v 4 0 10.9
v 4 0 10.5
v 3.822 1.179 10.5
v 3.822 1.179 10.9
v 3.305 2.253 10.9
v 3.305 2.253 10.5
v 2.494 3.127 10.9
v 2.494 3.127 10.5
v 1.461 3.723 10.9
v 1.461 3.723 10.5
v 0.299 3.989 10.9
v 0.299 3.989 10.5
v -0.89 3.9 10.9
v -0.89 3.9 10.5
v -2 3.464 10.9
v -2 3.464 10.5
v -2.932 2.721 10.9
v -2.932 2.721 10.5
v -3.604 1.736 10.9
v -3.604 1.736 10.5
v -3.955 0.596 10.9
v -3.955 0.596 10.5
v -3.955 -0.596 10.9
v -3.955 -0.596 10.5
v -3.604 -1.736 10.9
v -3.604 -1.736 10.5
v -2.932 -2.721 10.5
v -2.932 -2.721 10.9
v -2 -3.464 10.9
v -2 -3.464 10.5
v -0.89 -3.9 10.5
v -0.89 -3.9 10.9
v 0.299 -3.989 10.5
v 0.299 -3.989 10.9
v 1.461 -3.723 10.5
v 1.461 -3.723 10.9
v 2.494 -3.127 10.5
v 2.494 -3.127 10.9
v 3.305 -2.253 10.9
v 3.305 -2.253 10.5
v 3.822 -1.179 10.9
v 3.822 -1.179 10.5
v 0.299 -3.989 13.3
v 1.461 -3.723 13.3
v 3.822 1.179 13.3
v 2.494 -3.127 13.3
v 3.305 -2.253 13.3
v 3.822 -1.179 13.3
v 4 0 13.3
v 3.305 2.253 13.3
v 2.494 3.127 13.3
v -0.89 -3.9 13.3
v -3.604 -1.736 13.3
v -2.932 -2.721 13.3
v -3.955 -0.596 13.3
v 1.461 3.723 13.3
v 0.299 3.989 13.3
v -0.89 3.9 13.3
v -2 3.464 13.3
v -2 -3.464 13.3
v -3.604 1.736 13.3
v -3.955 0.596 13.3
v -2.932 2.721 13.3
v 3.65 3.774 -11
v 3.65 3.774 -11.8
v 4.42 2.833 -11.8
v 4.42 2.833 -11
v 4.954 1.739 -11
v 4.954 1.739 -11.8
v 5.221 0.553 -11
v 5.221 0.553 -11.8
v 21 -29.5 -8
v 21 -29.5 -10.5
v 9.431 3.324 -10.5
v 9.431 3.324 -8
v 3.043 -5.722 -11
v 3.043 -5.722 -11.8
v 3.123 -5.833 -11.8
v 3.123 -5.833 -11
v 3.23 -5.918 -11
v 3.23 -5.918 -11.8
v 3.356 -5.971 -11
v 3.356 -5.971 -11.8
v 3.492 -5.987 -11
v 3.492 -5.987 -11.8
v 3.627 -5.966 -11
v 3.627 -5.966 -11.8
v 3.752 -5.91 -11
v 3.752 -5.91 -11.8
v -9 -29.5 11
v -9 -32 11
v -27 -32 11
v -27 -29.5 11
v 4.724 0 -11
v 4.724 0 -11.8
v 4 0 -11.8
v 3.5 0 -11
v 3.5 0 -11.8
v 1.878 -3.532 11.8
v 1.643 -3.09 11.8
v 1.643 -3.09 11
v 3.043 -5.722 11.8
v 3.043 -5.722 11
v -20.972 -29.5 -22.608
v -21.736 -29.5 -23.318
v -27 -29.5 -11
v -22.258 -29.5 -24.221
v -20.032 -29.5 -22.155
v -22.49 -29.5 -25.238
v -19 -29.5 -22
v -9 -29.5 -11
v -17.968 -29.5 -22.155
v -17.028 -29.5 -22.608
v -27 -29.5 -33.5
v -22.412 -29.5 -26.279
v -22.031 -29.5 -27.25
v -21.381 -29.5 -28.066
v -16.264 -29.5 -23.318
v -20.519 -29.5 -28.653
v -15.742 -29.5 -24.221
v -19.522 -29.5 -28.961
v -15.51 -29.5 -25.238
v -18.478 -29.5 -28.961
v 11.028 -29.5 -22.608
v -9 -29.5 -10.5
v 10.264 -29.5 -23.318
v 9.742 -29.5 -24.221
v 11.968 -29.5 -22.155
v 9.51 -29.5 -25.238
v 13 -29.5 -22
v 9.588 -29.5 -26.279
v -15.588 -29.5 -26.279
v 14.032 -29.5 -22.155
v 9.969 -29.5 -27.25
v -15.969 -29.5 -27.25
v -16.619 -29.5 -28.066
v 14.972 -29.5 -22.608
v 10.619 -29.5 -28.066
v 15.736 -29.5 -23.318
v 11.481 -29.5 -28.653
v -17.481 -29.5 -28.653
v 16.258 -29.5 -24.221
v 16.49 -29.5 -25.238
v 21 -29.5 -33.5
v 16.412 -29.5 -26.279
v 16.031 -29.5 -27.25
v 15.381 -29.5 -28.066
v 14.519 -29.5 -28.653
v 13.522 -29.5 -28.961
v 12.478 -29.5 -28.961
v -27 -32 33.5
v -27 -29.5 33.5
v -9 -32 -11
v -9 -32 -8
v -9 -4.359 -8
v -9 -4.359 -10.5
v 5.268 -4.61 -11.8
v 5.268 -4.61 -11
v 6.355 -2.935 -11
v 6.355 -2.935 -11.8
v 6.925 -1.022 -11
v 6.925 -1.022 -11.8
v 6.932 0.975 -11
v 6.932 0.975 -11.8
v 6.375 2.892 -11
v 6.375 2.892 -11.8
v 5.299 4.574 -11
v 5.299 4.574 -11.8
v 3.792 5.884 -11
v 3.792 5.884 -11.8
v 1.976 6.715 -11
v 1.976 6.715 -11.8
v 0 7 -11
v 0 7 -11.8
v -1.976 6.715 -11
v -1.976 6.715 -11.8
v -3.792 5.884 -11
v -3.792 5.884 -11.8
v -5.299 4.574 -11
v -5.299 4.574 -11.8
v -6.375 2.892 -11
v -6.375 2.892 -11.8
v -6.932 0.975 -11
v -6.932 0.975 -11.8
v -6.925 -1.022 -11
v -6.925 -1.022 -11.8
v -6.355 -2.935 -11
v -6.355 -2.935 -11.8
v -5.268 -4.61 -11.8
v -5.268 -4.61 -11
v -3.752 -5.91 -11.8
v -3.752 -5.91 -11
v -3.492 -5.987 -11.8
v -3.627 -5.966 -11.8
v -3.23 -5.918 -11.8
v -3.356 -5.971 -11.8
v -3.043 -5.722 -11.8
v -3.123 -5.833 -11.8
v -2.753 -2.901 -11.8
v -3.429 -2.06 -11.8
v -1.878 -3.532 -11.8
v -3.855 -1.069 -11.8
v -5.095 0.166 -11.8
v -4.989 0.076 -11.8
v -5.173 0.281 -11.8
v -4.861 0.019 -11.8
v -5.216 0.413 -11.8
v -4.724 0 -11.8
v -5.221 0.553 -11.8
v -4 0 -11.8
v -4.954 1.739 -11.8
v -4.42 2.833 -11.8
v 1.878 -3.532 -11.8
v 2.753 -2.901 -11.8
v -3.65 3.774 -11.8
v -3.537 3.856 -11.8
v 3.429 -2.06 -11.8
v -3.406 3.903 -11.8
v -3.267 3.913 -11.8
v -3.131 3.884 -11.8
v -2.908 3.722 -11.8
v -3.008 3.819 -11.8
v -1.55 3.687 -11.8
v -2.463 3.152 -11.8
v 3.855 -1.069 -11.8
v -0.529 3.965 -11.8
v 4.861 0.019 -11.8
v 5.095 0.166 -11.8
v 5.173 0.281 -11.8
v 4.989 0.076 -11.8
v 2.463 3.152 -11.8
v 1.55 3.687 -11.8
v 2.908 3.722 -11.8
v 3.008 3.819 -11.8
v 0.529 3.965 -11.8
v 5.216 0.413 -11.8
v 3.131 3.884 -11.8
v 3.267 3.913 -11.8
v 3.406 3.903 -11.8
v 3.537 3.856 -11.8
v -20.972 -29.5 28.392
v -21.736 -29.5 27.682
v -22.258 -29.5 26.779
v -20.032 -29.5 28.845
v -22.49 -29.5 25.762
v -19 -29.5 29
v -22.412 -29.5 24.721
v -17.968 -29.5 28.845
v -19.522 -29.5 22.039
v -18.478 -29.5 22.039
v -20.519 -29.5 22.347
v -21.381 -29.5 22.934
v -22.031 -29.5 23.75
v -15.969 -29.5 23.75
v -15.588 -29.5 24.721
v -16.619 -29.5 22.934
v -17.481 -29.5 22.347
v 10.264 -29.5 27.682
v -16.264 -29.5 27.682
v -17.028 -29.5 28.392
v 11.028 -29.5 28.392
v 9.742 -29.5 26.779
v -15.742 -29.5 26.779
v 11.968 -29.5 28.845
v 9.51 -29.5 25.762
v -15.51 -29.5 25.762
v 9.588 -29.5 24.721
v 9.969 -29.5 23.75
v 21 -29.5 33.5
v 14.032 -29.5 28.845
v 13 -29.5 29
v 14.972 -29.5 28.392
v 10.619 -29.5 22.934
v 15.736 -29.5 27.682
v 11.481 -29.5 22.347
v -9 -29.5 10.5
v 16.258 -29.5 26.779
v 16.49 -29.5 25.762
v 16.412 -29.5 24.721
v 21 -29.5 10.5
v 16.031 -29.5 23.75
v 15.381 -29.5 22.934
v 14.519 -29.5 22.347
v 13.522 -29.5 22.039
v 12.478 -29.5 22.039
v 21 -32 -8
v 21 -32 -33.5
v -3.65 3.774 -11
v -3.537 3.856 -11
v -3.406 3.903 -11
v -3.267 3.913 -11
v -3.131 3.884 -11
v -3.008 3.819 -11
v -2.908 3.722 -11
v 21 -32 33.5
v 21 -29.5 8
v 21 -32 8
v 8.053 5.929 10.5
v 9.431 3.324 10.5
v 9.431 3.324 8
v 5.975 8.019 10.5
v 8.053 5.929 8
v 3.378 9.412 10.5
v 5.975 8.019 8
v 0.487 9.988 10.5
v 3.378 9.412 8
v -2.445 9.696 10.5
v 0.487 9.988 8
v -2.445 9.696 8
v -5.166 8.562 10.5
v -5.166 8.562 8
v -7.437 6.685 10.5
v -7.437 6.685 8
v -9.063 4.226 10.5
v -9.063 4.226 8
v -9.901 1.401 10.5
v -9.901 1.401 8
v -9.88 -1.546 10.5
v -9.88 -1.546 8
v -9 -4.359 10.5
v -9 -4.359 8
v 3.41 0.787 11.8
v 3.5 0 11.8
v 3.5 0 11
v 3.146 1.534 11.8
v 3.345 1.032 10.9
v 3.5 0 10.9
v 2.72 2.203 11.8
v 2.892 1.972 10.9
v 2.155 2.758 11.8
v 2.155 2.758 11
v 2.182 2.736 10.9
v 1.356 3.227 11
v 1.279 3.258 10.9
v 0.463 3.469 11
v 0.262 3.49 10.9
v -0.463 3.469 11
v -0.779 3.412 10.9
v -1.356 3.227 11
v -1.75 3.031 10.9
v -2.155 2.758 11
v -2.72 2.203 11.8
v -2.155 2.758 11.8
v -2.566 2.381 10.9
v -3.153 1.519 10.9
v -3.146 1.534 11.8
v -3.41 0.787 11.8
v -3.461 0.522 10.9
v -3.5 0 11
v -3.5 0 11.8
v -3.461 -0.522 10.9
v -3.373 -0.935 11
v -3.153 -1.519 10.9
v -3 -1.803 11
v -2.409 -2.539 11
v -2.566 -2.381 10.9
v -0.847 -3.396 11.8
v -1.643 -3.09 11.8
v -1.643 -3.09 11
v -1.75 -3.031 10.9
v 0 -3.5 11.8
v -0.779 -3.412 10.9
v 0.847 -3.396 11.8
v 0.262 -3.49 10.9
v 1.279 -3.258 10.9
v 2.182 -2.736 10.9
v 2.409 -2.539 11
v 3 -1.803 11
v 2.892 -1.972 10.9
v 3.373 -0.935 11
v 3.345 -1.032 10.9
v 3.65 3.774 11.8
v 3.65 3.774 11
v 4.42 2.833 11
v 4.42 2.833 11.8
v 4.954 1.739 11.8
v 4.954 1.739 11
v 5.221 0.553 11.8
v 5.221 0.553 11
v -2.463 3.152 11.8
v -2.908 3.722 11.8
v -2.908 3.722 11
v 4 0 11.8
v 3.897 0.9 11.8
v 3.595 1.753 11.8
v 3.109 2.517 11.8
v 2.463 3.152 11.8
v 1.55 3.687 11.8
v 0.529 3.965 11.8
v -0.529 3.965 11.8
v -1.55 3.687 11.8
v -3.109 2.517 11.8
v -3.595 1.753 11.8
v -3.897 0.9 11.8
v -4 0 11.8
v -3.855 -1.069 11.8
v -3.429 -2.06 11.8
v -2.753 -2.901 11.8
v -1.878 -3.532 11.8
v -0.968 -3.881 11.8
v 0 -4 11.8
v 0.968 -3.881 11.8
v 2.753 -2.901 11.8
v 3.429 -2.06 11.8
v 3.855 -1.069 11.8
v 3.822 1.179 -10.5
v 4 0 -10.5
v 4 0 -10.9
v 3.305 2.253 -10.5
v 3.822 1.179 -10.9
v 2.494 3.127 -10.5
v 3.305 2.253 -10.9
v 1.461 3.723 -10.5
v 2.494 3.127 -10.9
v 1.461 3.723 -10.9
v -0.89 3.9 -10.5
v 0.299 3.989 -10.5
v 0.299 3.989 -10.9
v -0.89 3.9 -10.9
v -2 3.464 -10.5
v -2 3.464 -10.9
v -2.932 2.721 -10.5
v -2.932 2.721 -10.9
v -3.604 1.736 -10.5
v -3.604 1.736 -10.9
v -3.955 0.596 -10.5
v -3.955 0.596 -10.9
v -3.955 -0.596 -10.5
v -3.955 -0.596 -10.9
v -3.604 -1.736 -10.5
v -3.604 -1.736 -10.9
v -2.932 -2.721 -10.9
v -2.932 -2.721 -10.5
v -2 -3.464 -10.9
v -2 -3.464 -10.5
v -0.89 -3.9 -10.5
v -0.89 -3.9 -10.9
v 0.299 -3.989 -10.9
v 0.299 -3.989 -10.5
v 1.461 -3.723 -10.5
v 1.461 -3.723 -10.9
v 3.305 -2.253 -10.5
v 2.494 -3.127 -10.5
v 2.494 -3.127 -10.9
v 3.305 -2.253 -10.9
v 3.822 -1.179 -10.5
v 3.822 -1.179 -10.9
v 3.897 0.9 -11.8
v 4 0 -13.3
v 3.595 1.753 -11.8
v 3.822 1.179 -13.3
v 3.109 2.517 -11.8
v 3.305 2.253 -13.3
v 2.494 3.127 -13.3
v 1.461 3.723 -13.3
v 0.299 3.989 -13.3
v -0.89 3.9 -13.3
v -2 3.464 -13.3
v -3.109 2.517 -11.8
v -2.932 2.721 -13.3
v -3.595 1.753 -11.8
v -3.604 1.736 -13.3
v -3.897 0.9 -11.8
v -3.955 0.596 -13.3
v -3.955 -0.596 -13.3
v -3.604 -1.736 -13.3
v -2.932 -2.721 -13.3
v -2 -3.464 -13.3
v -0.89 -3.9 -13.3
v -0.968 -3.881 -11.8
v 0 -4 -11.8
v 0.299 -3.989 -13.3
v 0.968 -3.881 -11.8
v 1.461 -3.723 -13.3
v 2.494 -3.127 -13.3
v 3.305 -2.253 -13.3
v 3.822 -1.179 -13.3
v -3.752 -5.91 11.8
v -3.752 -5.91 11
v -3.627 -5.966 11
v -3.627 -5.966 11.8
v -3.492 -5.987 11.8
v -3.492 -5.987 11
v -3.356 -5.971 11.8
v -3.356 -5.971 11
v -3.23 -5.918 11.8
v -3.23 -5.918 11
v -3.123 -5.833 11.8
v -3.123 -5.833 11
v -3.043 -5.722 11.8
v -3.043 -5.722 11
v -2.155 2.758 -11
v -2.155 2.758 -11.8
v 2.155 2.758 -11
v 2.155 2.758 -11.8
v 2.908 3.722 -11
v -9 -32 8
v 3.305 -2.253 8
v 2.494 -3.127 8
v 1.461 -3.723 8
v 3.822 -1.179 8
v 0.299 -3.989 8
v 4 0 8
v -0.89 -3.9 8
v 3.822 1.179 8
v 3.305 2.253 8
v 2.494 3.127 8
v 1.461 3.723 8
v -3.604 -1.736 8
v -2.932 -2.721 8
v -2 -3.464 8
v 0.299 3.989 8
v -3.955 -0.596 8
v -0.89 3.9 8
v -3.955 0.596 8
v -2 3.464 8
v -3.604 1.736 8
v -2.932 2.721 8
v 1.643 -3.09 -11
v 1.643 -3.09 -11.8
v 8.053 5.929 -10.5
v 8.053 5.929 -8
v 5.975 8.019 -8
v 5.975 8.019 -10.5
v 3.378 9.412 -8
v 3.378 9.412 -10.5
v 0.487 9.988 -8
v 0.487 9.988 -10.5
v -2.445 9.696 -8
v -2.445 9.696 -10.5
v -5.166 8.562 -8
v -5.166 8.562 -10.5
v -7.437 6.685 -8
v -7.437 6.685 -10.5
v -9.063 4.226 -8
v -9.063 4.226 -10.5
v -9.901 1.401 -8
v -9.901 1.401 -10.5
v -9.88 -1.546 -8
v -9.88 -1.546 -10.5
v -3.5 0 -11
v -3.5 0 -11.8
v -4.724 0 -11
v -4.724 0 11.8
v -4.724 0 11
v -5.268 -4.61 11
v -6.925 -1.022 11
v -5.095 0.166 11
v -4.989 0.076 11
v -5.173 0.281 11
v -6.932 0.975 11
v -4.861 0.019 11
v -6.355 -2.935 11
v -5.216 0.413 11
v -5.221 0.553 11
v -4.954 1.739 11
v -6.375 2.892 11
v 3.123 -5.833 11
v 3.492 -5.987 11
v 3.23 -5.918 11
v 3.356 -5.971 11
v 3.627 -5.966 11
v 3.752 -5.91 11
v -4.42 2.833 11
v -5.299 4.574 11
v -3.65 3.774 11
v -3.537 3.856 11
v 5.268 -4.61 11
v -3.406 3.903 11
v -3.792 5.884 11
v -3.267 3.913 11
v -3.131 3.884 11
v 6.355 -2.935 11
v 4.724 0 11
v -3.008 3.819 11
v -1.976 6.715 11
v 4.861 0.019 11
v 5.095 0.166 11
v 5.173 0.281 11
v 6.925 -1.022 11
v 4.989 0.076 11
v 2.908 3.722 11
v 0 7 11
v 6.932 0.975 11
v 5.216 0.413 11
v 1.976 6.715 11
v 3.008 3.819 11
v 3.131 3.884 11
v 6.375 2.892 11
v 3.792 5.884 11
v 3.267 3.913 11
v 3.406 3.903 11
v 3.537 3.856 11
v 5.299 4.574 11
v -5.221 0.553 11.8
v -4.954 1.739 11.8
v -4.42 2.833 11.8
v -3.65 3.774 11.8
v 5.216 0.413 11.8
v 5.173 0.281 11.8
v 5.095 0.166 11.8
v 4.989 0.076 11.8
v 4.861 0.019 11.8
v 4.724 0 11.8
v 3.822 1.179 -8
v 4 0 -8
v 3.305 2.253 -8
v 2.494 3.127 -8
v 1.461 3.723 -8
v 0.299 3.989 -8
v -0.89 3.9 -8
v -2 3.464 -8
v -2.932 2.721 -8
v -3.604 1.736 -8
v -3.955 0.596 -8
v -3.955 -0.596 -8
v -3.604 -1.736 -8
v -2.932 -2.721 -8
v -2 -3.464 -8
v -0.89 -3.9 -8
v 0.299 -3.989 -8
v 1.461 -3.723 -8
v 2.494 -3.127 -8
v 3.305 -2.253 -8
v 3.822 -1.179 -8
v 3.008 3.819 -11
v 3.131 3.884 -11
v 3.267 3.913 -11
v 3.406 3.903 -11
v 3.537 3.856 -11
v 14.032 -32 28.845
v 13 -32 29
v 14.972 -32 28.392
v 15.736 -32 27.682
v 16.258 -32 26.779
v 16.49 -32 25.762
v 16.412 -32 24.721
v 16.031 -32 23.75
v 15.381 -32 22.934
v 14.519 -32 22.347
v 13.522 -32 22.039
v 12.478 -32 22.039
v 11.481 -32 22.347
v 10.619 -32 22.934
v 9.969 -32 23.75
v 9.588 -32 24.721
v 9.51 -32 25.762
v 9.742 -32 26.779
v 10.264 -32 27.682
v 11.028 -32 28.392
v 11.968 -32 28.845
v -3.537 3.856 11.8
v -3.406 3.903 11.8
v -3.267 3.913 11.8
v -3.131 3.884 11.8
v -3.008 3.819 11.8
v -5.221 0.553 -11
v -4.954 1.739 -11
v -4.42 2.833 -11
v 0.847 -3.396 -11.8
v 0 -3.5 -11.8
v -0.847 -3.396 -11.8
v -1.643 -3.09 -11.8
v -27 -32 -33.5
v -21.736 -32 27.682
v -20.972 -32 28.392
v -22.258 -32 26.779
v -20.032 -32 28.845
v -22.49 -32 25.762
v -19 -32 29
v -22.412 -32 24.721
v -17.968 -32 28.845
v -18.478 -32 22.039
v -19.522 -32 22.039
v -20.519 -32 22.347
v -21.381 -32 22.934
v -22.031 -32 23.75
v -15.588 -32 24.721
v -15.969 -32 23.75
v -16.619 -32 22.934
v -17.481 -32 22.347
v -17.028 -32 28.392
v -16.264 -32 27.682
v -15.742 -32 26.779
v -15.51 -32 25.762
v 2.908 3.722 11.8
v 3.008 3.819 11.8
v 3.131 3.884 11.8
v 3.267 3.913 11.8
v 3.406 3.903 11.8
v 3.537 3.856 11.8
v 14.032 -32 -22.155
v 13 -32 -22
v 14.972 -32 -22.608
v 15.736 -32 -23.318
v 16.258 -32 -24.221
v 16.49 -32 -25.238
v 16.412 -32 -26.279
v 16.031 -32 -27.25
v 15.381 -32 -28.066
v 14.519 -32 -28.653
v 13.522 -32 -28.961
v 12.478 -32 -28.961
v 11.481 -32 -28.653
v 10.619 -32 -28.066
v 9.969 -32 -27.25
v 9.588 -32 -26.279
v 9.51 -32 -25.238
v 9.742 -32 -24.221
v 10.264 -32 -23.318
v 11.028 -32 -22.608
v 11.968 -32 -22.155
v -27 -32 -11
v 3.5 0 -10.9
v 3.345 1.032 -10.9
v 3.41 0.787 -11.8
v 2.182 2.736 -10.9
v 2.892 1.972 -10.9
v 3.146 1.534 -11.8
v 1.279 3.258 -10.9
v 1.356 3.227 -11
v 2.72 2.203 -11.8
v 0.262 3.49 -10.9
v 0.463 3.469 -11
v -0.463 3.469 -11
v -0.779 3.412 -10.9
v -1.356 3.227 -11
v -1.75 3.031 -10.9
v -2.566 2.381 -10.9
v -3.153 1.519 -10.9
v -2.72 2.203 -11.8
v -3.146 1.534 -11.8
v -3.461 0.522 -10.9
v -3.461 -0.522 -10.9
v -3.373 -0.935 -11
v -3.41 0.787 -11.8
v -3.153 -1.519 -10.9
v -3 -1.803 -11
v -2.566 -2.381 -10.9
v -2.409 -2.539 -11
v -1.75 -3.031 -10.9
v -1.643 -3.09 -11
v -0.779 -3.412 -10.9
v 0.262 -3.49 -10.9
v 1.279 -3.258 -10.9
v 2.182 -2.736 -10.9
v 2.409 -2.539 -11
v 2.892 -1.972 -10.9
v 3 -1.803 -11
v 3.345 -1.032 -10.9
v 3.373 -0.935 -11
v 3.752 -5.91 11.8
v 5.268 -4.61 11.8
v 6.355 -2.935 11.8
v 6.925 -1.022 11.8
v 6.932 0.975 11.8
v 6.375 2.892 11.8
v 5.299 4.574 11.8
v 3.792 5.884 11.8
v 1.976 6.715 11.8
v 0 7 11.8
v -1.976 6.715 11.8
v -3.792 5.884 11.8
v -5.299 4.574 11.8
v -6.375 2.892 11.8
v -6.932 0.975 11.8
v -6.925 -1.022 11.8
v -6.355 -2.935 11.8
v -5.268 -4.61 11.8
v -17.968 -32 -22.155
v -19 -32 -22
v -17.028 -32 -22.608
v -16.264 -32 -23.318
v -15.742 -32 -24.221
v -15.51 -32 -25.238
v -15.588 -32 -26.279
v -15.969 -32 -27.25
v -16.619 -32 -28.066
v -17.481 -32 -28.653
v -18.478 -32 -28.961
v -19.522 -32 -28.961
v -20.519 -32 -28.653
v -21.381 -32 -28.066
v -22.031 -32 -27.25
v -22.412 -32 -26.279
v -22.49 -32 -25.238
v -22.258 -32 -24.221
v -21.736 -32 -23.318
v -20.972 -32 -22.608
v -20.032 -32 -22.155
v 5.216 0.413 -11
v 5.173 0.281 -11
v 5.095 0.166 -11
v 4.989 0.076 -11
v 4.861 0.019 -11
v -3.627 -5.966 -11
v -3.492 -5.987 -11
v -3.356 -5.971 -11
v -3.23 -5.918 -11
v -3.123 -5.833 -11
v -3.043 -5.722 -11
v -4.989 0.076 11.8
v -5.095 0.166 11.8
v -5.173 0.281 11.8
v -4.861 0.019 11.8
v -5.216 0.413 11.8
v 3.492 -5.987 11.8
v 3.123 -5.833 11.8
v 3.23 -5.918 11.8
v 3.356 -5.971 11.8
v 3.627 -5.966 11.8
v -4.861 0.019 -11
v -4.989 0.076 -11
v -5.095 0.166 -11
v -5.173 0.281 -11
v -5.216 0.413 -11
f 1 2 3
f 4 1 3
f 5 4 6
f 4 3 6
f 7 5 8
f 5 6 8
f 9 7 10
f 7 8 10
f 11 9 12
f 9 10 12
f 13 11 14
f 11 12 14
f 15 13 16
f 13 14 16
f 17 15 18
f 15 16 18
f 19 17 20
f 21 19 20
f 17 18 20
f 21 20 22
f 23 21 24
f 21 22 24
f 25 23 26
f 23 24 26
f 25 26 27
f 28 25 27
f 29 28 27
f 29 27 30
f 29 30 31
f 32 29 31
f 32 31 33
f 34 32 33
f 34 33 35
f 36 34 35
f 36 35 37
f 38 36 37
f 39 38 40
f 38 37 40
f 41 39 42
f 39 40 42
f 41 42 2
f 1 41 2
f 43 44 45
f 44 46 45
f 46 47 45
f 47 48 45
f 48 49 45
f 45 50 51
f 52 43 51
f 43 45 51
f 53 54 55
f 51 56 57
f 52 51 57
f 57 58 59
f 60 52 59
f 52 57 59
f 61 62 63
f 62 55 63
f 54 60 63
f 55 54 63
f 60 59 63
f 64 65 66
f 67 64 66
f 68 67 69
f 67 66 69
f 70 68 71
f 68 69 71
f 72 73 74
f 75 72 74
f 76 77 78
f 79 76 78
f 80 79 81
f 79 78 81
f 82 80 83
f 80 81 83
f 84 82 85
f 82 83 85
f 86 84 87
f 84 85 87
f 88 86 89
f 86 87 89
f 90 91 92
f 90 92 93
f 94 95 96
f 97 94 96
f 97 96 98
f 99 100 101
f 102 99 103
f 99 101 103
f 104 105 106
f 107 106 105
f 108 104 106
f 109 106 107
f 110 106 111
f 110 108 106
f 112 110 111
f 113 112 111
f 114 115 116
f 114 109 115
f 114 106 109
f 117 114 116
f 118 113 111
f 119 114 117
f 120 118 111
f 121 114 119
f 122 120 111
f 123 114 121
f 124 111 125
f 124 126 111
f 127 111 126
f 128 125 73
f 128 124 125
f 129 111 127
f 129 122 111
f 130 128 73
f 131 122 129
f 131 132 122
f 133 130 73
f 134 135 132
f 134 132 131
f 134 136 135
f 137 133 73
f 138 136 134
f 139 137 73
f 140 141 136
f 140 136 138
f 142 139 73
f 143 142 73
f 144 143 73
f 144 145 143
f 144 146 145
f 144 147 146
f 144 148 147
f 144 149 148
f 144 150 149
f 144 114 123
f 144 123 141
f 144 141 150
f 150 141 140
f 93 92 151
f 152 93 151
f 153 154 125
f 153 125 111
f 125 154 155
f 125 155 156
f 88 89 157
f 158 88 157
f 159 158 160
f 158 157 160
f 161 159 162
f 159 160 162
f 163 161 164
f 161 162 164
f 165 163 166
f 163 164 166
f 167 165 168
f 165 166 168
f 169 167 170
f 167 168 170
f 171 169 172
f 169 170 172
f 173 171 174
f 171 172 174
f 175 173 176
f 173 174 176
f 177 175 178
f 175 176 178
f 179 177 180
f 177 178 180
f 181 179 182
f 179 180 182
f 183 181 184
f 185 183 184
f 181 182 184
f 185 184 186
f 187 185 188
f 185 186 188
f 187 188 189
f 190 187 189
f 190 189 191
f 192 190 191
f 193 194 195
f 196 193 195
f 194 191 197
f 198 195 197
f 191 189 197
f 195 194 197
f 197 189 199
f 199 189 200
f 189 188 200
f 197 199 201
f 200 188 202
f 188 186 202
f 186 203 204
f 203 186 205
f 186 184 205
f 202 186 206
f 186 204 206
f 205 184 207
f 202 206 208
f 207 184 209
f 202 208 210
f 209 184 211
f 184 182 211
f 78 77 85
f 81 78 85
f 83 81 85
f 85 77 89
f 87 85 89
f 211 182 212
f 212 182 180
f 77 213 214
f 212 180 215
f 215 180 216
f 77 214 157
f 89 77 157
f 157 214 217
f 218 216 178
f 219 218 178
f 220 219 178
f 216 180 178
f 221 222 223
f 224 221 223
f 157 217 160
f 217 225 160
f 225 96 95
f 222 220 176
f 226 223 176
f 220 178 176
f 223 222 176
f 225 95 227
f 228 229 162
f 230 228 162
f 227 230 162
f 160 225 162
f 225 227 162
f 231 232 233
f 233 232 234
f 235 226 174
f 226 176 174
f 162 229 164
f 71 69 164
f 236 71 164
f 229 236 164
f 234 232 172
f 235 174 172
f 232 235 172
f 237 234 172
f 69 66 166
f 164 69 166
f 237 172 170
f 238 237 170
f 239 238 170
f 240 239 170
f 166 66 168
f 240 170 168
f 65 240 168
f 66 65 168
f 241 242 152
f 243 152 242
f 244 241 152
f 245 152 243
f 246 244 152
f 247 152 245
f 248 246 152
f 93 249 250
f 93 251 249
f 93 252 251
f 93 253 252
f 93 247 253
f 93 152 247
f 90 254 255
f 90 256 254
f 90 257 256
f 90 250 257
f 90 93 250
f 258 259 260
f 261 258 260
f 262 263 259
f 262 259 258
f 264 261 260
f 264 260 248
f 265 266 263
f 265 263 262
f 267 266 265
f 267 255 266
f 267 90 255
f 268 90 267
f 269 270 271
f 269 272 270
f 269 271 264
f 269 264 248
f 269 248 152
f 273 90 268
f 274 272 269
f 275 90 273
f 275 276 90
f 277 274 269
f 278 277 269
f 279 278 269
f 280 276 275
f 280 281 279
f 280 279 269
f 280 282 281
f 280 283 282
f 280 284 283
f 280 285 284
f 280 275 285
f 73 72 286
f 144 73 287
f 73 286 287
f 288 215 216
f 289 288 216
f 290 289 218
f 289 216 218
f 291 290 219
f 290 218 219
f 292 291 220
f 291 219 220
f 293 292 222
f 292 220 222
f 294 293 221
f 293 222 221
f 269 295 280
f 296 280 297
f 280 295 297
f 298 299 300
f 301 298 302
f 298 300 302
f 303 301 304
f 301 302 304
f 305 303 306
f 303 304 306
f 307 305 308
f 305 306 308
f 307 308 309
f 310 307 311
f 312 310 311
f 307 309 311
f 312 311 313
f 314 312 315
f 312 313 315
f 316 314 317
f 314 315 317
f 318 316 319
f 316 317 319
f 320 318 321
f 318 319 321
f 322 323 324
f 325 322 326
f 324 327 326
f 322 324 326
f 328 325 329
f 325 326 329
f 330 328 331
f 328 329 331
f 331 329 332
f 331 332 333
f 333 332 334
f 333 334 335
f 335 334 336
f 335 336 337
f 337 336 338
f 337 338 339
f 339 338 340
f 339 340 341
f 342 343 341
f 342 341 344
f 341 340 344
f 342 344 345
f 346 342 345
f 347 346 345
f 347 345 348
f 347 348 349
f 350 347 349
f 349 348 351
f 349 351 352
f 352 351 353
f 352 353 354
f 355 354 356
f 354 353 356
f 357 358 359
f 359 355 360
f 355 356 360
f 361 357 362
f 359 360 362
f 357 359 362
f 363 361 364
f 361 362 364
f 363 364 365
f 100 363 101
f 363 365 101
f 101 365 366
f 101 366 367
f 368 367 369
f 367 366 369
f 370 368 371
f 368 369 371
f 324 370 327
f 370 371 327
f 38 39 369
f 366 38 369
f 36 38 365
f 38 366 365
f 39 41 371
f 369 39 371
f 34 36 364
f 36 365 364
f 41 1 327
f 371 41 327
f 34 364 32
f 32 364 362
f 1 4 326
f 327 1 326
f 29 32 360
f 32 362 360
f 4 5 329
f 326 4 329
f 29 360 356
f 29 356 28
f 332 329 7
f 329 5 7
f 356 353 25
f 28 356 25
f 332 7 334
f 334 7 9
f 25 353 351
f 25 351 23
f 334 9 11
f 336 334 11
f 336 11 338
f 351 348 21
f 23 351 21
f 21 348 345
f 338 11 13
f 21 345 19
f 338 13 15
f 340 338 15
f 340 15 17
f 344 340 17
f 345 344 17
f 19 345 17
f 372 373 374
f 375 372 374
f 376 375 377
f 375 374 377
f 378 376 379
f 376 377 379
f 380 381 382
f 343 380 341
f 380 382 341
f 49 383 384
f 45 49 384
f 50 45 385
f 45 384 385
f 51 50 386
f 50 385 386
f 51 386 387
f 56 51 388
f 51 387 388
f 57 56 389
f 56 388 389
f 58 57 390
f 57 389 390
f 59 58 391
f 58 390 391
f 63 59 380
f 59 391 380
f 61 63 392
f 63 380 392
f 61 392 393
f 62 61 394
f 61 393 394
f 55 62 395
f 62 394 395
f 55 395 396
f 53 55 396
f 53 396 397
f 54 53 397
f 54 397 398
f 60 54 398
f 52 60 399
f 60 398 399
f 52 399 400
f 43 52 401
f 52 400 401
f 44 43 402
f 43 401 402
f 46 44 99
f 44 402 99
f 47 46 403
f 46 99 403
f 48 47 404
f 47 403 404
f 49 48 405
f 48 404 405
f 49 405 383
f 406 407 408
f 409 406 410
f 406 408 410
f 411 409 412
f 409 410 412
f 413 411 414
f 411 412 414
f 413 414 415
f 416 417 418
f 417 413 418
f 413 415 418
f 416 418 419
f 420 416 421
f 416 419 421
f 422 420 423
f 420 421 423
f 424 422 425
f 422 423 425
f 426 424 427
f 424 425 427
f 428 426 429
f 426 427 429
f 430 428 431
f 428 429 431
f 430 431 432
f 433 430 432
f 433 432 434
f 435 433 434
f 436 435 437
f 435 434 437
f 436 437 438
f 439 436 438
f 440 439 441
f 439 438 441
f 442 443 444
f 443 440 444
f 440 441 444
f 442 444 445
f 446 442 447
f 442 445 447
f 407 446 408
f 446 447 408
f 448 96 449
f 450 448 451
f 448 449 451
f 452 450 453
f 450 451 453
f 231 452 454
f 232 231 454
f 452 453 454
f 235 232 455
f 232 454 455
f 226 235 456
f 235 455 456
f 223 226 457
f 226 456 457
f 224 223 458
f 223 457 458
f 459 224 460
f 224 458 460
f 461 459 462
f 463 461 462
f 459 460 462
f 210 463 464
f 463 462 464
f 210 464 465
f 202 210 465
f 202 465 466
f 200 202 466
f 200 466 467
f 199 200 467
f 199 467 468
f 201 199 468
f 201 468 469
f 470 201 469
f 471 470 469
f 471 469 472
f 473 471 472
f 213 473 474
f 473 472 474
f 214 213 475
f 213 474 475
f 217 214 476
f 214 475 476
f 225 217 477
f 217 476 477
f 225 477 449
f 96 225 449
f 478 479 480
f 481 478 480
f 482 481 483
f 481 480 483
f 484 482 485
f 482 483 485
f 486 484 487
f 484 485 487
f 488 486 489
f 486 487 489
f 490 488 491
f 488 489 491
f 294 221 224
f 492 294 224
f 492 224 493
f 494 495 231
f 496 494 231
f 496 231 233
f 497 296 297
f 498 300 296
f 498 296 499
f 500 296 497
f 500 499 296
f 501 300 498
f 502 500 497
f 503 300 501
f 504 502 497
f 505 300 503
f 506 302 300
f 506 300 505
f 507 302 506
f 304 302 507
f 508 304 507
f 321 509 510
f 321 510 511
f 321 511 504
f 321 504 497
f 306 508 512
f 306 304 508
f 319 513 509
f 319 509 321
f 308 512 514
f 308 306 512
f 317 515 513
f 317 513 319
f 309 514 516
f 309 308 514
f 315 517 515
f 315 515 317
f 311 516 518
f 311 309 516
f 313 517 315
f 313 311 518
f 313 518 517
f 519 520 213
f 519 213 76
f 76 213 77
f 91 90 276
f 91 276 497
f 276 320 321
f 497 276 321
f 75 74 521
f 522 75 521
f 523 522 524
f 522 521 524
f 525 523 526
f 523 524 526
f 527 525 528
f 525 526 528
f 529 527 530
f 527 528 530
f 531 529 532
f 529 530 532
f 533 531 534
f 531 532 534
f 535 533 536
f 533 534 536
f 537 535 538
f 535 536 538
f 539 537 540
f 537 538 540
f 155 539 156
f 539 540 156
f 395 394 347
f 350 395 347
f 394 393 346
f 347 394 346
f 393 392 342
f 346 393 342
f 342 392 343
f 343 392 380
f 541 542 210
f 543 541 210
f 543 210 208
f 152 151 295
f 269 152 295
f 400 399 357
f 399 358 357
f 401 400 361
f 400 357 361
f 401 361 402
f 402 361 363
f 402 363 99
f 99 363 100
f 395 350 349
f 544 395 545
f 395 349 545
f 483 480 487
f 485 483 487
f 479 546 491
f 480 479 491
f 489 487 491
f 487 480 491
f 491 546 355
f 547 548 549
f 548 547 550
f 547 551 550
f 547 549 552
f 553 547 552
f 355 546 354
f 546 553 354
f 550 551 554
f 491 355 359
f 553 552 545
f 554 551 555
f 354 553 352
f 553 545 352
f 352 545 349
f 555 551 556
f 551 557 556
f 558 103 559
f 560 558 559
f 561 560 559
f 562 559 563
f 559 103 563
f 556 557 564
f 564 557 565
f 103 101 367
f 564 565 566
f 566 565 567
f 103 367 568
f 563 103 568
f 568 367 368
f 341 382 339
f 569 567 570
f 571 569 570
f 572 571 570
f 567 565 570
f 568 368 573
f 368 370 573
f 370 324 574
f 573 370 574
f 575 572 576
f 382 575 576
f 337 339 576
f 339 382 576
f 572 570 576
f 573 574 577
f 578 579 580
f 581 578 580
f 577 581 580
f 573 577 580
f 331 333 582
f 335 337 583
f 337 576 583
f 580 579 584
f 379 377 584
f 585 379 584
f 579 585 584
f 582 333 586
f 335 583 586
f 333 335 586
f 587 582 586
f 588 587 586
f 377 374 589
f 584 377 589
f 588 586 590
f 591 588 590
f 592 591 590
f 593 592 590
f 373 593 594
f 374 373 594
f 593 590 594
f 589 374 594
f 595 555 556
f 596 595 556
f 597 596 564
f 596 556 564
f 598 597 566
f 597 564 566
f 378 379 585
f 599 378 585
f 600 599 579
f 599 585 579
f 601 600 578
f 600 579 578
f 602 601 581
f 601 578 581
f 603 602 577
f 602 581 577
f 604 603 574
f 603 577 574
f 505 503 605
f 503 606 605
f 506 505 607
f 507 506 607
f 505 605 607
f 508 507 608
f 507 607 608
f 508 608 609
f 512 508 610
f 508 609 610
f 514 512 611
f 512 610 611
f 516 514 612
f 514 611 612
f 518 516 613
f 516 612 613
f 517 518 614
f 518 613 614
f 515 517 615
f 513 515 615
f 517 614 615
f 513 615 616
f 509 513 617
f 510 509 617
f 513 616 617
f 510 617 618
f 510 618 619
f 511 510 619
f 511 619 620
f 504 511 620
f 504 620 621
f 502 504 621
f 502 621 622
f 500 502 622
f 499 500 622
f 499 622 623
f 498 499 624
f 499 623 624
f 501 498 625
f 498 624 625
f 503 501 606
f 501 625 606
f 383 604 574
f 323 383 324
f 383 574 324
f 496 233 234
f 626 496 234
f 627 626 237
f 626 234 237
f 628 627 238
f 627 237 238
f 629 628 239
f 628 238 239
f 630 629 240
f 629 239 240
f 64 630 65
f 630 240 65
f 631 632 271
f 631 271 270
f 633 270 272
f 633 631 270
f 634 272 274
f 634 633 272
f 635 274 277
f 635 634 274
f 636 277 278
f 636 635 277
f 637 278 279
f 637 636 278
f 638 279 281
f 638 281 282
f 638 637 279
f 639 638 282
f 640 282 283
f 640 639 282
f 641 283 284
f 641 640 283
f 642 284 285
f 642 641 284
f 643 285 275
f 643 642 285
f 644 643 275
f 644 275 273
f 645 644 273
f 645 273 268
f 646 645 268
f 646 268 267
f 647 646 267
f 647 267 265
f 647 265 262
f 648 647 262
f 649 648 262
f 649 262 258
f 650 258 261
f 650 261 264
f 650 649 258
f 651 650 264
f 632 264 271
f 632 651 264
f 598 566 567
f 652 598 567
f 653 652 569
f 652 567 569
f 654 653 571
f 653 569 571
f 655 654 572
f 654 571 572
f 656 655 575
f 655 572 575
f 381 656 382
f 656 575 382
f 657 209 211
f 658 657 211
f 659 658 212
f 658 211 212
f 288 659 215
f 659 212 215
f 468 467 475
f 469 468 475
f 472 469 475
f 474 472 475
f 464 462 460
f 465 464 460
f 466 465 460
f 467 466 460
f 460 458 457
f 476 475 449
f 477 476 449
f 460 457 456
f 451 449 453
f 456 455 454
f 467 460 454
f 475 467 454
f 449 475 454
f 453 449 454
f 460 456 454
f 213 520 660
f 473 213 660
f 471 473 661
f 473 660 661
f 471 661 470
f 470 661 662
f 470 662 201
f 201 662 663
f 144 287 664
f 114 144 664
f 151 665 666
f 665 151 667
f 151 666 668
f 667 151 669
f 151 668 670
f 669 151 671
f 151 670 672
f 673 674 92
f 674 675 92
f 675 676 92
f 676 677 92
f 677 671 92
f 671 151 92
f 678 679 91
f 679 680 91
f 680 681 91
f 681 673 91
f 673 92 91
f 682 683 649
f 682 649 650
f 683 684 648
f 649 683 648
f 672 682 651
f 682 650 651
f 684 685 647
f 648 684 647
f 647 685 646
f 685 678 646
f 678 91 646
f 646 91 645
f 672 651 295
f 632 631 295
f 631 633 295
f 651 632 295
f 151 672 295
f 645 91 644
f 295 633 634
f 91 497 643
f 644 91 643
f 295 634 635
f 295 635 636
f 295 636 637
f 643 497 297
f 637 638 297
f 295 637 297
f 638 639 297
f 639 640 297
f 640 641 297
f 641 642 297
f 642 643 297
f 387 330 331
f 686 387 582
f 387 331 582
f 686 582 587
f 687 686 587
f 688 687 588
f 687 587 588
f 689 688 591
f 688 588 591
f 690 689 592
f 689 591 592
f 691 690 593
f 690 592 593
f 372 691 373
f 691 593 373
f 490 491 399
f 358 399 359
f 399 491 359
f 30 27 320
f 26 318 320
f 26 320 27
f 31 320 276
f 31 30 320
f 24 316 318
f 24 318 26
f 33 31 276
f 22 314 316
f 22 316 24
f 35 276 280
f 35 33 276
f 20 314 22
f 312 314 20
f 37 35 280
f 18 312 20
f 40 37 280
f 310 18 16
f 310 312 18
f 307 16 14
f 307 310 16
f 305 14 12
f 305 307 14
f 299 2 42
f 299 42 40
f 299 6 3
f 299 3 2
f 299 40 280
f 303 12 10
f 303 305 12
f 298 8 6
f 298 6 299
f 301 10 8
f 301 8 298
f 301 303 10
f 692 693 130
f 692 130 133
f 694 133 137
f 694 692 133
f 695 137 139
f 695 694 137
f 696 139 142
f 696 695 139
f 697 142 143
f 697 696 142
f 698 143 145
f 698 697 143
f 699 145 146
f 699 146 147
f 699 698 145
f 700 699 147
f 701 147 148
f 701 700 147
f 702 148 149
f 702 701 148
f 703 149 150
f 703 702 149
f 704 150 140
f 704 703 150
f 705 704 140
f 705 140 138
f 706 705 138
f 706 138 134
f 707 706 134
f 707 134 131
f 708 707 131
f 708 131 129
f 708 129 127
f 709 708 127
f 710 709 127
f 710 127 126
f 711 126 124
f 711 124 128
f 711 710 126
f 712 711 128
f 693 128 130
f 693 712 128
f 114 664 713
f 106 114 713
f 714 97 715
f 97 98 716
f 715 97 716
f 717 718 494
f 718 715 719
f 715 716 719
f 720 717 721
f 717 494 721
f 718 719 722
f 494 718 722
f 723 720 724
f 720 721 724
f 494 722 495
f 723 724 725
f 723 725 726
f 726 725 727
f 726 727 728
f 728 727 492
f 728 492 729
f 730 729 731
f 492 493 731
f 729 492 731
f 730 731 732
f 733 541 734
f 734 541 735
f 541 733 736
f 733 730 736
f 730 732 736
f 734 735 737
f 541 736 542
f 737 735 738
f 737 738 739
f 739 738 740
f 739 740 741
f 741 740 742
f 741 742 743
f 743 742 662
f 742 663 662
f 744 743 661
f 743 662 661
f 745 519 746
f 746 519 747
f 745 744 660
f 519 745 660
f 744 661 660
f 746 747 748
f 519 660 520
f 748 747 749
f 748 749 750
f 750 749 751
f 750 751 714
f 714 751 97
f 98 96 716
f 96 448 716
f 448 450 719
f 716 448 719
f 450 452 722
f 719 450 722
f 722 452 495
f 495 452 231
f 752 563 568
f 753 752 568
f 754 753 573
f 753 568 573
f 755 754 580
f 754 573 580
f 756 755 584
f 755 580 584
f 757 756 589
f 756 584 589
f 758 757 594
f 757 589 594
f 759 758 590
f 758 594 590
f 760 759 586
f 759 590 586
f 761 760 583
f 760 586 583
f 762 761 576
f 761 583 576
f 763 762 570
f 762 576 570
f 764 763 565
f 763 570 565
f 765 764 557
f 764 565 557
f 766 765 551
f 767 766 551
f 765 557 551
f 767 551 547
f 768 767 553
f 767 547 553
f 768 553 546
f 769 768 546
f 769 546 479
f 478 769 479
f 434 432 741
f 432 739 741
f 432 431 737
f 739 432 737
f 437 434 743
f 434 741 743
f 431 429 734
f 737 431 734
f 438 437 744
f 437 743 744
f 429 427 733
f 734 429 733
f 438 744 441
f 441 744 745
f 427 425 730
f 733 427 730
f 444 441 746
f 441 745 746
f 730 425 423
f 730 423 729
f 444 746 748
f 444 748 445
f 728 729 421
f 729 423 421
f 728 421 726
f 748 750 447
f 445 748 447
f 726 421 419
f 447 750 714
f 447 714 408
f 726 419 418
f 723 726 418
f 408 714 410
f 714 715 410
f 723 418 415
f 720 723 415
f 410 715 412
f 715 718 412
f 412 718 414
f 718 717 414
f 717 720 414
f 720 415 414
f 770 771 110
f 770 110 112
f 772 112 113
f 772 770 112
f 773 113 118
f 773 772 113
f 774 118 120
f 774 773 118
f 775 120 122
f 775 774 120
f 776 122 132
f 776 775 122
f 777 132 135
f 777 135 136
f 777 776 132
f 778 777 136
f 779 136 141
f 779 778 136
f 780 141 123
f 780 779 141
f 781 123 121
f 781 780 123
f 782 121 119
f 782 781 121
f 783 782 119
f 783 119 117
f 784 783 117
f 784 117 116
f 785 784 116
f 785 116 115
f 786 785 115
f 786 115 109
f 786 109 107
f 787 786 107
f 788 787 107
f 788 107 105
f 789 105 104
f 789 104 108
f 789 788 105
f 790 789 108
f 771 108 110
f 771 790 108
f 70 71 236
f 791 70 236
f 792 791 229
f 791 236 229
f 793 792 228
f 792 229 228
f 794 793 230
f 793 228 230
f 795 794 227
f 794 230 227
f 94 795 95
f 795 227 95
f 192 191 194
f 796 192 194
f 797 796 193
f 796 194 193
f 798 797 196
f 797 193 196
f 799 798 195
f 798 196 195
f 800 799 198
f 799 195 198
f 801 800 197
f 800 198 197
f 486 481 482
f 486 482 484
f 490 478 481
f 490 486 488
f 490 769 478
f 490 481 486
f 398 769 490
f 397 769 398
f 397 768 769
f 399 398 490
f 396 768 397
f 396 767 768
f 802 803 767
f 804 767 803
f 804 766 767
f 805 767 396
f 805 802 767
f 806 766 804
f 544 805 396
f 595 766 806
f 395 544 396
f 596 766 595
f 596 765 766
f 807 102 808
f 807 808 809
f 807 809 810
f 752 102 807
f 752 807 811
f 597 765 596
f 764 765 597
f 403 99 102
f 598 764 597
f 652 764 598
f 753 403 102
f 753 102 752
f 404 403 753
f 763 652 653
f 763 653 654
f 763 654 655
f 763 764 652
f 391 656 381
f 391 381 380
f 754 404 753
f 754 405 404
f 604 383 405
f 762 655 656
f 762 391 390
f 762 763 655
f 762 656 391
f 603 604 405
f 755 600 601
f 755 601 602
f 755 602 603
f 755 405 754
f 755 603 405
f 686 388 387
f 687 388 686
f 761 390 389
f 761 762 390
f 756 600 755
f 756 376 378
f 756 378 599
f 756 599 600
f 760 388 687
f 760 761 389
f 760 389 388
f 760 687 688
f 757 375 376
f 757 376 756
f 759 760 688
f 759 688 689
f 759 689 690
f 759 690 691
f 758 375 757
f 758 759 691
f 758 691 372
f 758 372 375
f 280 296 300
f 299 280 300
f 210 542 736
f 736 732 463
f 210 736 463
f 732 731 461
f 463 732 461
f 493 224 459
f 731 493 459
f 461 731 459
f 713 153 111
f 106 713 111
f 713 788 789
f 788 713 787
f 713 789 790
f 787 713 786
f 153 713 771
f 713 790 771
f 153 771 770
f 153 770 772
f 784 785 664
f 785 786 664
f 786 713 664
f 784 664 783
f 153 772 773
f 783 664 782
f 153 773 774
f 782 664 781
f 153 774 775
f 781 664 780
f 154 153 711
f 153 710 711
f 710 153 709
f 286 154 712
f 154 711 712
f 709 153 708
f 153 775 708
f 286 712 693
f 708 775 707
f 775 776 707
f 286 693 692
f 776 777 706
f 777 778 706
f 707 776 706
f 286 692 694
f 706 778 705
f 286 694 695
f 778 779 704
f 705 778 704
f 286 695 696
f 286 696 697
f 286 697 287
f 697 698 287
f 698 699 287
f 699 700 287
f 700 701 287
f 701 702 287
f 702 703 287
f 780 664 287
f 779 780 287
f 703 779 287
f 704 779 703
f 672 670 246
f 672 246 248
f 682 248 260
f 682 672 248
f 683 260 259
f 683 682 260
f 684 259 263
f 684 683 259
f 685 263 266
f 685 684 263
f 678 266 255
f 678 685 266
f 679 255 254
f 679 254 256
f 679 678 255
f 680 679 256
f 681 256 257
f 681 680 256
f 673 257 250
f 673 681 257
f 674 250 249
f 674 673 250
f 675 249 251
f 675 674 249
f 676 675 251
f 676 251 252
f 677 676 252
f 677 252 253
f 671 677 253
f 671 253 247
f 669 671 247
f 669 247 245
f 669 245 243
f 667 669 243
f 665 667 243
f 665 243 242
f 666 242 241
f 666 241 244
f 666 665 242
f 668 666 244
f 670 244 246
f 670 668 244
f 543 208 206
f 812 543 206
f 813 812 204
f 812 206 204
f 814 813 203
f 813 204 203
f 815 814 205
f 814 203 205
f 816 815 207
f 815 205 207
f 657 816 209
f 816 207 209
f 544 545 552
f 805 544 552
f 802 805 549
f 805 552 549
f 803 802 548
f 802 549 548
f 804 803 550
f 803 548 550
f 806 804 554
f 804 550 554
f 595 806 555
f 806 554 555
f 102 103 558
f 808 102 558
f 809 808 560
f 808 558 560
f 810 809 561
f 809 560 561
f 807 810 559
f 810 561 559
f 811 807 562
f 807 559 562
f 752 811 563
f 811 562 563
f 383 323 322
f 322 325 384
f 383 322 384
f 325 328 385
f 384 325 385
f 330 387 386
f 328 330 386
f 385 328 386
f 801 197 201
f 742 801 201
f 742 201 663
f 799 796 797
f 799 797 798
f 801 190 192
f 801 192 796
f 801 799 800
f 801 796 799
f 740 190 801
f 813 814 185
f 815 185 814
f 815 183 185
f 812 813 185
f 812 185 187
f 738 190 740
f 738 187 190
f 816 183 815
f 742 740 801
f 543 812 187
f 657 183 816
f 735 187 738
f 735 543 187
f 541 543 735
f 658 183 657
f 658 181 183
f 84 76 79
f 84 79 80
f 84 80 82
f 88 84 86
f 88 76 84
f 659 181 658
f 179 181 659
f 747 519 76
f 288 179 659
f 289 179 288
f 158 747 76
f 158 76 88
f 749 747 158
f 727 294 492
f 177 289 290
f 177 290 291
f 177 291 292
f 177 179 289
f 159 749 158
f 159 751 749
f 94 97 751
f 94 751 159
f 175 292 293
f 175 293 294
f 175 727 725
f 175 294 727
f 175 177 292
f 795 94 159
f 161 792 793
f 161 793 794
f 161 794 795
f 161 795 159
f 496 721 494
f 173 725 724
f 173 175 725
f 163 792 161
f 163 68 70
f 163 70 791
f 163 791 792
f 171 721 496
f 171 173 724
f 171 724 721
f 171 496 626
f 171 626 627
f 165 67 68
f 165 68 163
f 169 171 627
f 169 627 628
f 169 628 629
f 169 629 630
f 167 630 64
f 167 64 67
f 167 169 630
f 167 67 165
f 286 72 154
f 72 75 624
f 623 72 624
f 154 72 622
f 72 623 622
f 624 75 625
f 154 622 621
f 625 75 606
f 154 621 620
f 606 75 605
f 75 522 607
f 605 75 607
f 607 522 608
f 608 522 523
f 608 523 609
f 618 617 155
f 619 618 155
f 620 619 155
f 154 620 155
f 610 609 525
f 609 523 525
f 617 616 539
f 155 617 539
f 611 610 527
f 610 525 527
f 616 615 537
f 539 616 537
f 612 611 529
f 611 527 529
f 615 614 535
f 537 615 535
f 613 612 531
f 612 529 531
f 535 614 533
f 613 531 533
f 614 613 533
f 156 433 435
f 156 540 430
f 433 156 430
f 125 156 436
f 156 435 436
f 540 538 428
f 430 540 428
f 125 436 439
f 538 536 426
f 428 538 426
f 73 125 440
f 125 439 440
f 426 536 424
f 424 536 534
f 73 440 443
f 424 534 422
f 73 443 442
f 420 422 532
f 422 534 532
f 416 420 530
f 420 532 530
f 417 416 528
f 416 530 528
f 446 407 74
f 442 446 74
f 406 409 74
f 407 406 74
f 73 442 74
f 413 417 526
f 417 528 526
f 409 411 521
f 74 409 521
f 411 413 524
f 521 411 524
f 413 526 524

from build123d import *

# Parameters (mm, degrees)
EXTRUDE_1_DEPTH      = 10.5
EXTRUDE_1_DEPTH_BACK = 10.5
SKETCH_3_W           = 16
SKETCH_3_H           = 52
SKETCH_4_R           = 3.5
EXTRUDE_2_DEPTH      = 2.5
SKETCH_5_W           = 22
SKETCH_5_H           = 2.5
CUT_EXTRUDE_1_DEPTH  = 18
EXTRUDE_START        = -0.8
EXTRUDE_3_DEPTH      = 0.8
EXTRUDE_4_DEPTH      = 0.8


with BuildPart() as part:
    # 草图1 → 旋转1 (revolve)
    with BuildSketch(Plane(origin=(0, 0, 0), x_dir=(0, 0, -1), z_dir=(1, 0, 0))):
        Polygon((-13.3, 0), (-13.3, 4), (-11.8, 4), (-11.8, 3.5), (-10.9, 3.5), (-10.9, 4), (10.9, 4), (10.9, 3.5), (11.8, 3.5), (11.8, 4), (13.3, 4), (13.3, 0), align=None)
    revolve(axis=Axis((0, 0, -13.3), (0, 0, 1)))

    # 草图2 → 凸台-拉伸1 (add, two sides: drawn at the far end of the back side and taken through both)
    with BuildSketch(Plane.XY.offset(-EXTRUDE_1_DEPTH_BACK)):
        with BuildLine():
            Line((-9, -4.358898944), (-9, -32))
            Line((-9, -32), (21, -32))
            Line((21, -32), (21, -29.5))
            Line((21, -29.5), (9.431374679, 3.324029432))
            ThreePointArc((9.431374679, 3.324029432), (-3.84751454, 9.230202157), (-9, -4.358898944))
        make_face()
    extrude(amount=EXTRUDE_1_DEPTH + EXTRUDE_1_DEPTH_BACK)

    # 草图3 → 切除-旋转1 (revolve, cut)
    with BuildSketch(Plane(origin=(0, 0, 0), x_dir=(0, 0, -1), z_dir=(1, 0, 0))):
        with Locations((0, 30)):
            Rectangle(SKETCH_3_W, SKETCH_3_H)
    revolve(axis=Axis((0, 0, -10), (0, 0, 1)), mode=Mode.SUBTRACT)

    # 草图4 → 凸台-拉伸2 (add)
    with BuildSketch(Plane(origin=(0, -32, 0), x_dir=(1, 0, 0), z_dir=(0, 1, 0))):
        Polygon((-27, 33.5), (-27, -33.5), (21, -33.5), (21, -8), (-9, -8), (-9, 8), (21, 8), (21, 33.5), align=None)
        with Locations((13, 25.5)):
            Circle(SKETCH_4_R, mode=Mode.SUBTRACT)
        with Locations((13, -25.5)):
            Circle(SKETCH_4_R, mode=Mode.SUBTRACT)
        with Locations((-19, 25.5)):
            Circle(SKETCH_4_R, mode=Mode.SUBTRACT)
        with Locations((-19, -25.5)):
            Circle(SKETCH_4_R, mode=Mode.SUBTRACT)
    extrude(amount=EXTRUDE_2_DEPTH)

    # 草图5 → 切除-拉伸1 (cut)
    with BuildSketch(Plane(origin=(-9, 0, 0), x_dir=(0, 0, -1), z_dir=(1, 0, 0))):
        with Locations((0, -30.75)):
            Rectangle(SKETCH_5_W, SKETCH_5_H)
    extrude(amount=-CUT_EXTRUDE_1_DEPTH, mode=Mode.SUBTRACT)

    # 草图6 → 凸台-拉伸3 (add)
    with BuildSketch(Plane.XY.offset(11.8).offset(EXTRUDE_START)):
        with BuildLine():
            Line((-3.042523464, -5.7221544), (-1.64315047, -3.090316575))
            ThreePointArc((-1.64315047, -3.090316575), (-3.000085552, -1.802633262), (-3.5, 0))
            Line((-3.5, 0), (-4.723610907, 0))
            ThreePointArc((-4.723610907, 0), (-5.095306878, 0.165571973), (-5.220833108, 0.552631579))
            ThreePointArc((-5.220833108, 0.552631579), (-4.718668743, 2.301448521), (-3.64974544, 3.773838658))
            ThreePointArc((-3.64974544, 3.773838658), (-3.267456645, 3.913220327), (-2.90814526, 3.722256191))
            Line((-2.90814526, 3.722256191), (-2.154815164, 2.758037638))
            ThreePointArc((-2.154815164, 2.758037638), (0, 3.5), (2.154815164, 2.758037638))
            Line((2.154815164, 2.758037638), (2.90814526, 3.722256191))
            ThreePointArc((2.90814526, 3.722256191), (3.26745663, 3.913220326), (3.64974542, 3.773838678))
            ThreePointArc((3.64974542, 3.773838678), (4.718668737, 2.301448534), (5.220833108, 0.552631579))
            ThreePointArc((5.220833108, 0.552631579), (5.095306878, 0.165571973), (4.723610907, 0))
            Line((4.723610907, 0), (3.5, 0))
            ThreePointArc((3.5, 0), (3.000085552, -1.802633262), (1.64315047, -3.090316575))
            Line((1.64315047, -3.090316575), (3.042523464, -5.7221544))
            ThreePointArc((3.042523464, -5.7221544), (3.356323848, -5.970843379), (3.751997049, -5.909527743))
            ThreePointArc((3.751997049, -5.909527743), (0, 7), (-3.751997049, -5.909527743))
            ThreePointArc((-3.751997049, -5.909527743), (-3.356323848, -5.970843379), (-3.042523464, -5.7221544))
        make_face()
    extrude(amount=EXTRUDE_3_DEPTH)

    # 草图7 → 凸台-拉伸4 (add)
    with BuildSketch(Plane.XY.offset(-11.8)):
        with BuildLine():
            Line((-3.042523464, -5.7221544), (-1.64315047, -3.090316575))
            ThreePointArc((-1.64315047, -3.090316575), (-3.000085552, -1.802633262), (-3.5, 0))
            Line((-3.5, 0), (-4.723610907, 0))
            ThreePointArc((-4.723610907, 0), (-5.095306878, 0.165571973), (-5.220833108, 0.552631579))
            ThreePointArc((-5.220833108, 0.552631579), (-4.718668743, 2.301448521), (-3.64974544, 3.773838658))
            ThreePointArc((-3.64974544, 3.773838658), (-3.267456645, 3.913220327), (-2.90814526, 3.722256191))
            Line((-2.90814526, 3.722256191), (-2.154815164, 2.758037638))
            ThreePointArc((-2.154815164, 2.758037638), (0, 3.5), (2.154815164, 2.758037638))
            Line((2.154815164, 2.758037638), (2.90814526, 3.722256191))
            ThreePointArc((2.90814526, 3.722256191), (3.26745663, 3.913220326), (3.64974542, 3.773838678))
            ThreePointArc((3.64974542, 3.773838678), (4.718668737, 2.301448534), (5.220833108, 0.552631579))
            ThreePointArc((5.220833108, 0.552631579), (5.095306878, 0.165571973), (4.723610907, 0))
            Line((4.723610907, 0), (3.5, 0))
            ThreePointArc((3.5, 0), (3.000085552, -1.802633262), (1.64315047, -3.090316575))
            Line((1.64315047, -3.090316575), (3.042523464, -5.7221544))
            ThreePointArc((3.042523464, -5.7221544), (3.356323848, -5.970843379), (3.751997049, -5.909527743))
            ThreePointArc((3.751997049, -5.909527743), (0, 7), (-3.751997049, -5.909527743))
            ThreePointArc((-3.751997049, -5.909527743), (-3.356323848, -5.970843379), (-3.042523464, -5.7221544))
        make_face()
    extrude(amount=EXTRUDE_4_DEPTH)


solid = part.part
